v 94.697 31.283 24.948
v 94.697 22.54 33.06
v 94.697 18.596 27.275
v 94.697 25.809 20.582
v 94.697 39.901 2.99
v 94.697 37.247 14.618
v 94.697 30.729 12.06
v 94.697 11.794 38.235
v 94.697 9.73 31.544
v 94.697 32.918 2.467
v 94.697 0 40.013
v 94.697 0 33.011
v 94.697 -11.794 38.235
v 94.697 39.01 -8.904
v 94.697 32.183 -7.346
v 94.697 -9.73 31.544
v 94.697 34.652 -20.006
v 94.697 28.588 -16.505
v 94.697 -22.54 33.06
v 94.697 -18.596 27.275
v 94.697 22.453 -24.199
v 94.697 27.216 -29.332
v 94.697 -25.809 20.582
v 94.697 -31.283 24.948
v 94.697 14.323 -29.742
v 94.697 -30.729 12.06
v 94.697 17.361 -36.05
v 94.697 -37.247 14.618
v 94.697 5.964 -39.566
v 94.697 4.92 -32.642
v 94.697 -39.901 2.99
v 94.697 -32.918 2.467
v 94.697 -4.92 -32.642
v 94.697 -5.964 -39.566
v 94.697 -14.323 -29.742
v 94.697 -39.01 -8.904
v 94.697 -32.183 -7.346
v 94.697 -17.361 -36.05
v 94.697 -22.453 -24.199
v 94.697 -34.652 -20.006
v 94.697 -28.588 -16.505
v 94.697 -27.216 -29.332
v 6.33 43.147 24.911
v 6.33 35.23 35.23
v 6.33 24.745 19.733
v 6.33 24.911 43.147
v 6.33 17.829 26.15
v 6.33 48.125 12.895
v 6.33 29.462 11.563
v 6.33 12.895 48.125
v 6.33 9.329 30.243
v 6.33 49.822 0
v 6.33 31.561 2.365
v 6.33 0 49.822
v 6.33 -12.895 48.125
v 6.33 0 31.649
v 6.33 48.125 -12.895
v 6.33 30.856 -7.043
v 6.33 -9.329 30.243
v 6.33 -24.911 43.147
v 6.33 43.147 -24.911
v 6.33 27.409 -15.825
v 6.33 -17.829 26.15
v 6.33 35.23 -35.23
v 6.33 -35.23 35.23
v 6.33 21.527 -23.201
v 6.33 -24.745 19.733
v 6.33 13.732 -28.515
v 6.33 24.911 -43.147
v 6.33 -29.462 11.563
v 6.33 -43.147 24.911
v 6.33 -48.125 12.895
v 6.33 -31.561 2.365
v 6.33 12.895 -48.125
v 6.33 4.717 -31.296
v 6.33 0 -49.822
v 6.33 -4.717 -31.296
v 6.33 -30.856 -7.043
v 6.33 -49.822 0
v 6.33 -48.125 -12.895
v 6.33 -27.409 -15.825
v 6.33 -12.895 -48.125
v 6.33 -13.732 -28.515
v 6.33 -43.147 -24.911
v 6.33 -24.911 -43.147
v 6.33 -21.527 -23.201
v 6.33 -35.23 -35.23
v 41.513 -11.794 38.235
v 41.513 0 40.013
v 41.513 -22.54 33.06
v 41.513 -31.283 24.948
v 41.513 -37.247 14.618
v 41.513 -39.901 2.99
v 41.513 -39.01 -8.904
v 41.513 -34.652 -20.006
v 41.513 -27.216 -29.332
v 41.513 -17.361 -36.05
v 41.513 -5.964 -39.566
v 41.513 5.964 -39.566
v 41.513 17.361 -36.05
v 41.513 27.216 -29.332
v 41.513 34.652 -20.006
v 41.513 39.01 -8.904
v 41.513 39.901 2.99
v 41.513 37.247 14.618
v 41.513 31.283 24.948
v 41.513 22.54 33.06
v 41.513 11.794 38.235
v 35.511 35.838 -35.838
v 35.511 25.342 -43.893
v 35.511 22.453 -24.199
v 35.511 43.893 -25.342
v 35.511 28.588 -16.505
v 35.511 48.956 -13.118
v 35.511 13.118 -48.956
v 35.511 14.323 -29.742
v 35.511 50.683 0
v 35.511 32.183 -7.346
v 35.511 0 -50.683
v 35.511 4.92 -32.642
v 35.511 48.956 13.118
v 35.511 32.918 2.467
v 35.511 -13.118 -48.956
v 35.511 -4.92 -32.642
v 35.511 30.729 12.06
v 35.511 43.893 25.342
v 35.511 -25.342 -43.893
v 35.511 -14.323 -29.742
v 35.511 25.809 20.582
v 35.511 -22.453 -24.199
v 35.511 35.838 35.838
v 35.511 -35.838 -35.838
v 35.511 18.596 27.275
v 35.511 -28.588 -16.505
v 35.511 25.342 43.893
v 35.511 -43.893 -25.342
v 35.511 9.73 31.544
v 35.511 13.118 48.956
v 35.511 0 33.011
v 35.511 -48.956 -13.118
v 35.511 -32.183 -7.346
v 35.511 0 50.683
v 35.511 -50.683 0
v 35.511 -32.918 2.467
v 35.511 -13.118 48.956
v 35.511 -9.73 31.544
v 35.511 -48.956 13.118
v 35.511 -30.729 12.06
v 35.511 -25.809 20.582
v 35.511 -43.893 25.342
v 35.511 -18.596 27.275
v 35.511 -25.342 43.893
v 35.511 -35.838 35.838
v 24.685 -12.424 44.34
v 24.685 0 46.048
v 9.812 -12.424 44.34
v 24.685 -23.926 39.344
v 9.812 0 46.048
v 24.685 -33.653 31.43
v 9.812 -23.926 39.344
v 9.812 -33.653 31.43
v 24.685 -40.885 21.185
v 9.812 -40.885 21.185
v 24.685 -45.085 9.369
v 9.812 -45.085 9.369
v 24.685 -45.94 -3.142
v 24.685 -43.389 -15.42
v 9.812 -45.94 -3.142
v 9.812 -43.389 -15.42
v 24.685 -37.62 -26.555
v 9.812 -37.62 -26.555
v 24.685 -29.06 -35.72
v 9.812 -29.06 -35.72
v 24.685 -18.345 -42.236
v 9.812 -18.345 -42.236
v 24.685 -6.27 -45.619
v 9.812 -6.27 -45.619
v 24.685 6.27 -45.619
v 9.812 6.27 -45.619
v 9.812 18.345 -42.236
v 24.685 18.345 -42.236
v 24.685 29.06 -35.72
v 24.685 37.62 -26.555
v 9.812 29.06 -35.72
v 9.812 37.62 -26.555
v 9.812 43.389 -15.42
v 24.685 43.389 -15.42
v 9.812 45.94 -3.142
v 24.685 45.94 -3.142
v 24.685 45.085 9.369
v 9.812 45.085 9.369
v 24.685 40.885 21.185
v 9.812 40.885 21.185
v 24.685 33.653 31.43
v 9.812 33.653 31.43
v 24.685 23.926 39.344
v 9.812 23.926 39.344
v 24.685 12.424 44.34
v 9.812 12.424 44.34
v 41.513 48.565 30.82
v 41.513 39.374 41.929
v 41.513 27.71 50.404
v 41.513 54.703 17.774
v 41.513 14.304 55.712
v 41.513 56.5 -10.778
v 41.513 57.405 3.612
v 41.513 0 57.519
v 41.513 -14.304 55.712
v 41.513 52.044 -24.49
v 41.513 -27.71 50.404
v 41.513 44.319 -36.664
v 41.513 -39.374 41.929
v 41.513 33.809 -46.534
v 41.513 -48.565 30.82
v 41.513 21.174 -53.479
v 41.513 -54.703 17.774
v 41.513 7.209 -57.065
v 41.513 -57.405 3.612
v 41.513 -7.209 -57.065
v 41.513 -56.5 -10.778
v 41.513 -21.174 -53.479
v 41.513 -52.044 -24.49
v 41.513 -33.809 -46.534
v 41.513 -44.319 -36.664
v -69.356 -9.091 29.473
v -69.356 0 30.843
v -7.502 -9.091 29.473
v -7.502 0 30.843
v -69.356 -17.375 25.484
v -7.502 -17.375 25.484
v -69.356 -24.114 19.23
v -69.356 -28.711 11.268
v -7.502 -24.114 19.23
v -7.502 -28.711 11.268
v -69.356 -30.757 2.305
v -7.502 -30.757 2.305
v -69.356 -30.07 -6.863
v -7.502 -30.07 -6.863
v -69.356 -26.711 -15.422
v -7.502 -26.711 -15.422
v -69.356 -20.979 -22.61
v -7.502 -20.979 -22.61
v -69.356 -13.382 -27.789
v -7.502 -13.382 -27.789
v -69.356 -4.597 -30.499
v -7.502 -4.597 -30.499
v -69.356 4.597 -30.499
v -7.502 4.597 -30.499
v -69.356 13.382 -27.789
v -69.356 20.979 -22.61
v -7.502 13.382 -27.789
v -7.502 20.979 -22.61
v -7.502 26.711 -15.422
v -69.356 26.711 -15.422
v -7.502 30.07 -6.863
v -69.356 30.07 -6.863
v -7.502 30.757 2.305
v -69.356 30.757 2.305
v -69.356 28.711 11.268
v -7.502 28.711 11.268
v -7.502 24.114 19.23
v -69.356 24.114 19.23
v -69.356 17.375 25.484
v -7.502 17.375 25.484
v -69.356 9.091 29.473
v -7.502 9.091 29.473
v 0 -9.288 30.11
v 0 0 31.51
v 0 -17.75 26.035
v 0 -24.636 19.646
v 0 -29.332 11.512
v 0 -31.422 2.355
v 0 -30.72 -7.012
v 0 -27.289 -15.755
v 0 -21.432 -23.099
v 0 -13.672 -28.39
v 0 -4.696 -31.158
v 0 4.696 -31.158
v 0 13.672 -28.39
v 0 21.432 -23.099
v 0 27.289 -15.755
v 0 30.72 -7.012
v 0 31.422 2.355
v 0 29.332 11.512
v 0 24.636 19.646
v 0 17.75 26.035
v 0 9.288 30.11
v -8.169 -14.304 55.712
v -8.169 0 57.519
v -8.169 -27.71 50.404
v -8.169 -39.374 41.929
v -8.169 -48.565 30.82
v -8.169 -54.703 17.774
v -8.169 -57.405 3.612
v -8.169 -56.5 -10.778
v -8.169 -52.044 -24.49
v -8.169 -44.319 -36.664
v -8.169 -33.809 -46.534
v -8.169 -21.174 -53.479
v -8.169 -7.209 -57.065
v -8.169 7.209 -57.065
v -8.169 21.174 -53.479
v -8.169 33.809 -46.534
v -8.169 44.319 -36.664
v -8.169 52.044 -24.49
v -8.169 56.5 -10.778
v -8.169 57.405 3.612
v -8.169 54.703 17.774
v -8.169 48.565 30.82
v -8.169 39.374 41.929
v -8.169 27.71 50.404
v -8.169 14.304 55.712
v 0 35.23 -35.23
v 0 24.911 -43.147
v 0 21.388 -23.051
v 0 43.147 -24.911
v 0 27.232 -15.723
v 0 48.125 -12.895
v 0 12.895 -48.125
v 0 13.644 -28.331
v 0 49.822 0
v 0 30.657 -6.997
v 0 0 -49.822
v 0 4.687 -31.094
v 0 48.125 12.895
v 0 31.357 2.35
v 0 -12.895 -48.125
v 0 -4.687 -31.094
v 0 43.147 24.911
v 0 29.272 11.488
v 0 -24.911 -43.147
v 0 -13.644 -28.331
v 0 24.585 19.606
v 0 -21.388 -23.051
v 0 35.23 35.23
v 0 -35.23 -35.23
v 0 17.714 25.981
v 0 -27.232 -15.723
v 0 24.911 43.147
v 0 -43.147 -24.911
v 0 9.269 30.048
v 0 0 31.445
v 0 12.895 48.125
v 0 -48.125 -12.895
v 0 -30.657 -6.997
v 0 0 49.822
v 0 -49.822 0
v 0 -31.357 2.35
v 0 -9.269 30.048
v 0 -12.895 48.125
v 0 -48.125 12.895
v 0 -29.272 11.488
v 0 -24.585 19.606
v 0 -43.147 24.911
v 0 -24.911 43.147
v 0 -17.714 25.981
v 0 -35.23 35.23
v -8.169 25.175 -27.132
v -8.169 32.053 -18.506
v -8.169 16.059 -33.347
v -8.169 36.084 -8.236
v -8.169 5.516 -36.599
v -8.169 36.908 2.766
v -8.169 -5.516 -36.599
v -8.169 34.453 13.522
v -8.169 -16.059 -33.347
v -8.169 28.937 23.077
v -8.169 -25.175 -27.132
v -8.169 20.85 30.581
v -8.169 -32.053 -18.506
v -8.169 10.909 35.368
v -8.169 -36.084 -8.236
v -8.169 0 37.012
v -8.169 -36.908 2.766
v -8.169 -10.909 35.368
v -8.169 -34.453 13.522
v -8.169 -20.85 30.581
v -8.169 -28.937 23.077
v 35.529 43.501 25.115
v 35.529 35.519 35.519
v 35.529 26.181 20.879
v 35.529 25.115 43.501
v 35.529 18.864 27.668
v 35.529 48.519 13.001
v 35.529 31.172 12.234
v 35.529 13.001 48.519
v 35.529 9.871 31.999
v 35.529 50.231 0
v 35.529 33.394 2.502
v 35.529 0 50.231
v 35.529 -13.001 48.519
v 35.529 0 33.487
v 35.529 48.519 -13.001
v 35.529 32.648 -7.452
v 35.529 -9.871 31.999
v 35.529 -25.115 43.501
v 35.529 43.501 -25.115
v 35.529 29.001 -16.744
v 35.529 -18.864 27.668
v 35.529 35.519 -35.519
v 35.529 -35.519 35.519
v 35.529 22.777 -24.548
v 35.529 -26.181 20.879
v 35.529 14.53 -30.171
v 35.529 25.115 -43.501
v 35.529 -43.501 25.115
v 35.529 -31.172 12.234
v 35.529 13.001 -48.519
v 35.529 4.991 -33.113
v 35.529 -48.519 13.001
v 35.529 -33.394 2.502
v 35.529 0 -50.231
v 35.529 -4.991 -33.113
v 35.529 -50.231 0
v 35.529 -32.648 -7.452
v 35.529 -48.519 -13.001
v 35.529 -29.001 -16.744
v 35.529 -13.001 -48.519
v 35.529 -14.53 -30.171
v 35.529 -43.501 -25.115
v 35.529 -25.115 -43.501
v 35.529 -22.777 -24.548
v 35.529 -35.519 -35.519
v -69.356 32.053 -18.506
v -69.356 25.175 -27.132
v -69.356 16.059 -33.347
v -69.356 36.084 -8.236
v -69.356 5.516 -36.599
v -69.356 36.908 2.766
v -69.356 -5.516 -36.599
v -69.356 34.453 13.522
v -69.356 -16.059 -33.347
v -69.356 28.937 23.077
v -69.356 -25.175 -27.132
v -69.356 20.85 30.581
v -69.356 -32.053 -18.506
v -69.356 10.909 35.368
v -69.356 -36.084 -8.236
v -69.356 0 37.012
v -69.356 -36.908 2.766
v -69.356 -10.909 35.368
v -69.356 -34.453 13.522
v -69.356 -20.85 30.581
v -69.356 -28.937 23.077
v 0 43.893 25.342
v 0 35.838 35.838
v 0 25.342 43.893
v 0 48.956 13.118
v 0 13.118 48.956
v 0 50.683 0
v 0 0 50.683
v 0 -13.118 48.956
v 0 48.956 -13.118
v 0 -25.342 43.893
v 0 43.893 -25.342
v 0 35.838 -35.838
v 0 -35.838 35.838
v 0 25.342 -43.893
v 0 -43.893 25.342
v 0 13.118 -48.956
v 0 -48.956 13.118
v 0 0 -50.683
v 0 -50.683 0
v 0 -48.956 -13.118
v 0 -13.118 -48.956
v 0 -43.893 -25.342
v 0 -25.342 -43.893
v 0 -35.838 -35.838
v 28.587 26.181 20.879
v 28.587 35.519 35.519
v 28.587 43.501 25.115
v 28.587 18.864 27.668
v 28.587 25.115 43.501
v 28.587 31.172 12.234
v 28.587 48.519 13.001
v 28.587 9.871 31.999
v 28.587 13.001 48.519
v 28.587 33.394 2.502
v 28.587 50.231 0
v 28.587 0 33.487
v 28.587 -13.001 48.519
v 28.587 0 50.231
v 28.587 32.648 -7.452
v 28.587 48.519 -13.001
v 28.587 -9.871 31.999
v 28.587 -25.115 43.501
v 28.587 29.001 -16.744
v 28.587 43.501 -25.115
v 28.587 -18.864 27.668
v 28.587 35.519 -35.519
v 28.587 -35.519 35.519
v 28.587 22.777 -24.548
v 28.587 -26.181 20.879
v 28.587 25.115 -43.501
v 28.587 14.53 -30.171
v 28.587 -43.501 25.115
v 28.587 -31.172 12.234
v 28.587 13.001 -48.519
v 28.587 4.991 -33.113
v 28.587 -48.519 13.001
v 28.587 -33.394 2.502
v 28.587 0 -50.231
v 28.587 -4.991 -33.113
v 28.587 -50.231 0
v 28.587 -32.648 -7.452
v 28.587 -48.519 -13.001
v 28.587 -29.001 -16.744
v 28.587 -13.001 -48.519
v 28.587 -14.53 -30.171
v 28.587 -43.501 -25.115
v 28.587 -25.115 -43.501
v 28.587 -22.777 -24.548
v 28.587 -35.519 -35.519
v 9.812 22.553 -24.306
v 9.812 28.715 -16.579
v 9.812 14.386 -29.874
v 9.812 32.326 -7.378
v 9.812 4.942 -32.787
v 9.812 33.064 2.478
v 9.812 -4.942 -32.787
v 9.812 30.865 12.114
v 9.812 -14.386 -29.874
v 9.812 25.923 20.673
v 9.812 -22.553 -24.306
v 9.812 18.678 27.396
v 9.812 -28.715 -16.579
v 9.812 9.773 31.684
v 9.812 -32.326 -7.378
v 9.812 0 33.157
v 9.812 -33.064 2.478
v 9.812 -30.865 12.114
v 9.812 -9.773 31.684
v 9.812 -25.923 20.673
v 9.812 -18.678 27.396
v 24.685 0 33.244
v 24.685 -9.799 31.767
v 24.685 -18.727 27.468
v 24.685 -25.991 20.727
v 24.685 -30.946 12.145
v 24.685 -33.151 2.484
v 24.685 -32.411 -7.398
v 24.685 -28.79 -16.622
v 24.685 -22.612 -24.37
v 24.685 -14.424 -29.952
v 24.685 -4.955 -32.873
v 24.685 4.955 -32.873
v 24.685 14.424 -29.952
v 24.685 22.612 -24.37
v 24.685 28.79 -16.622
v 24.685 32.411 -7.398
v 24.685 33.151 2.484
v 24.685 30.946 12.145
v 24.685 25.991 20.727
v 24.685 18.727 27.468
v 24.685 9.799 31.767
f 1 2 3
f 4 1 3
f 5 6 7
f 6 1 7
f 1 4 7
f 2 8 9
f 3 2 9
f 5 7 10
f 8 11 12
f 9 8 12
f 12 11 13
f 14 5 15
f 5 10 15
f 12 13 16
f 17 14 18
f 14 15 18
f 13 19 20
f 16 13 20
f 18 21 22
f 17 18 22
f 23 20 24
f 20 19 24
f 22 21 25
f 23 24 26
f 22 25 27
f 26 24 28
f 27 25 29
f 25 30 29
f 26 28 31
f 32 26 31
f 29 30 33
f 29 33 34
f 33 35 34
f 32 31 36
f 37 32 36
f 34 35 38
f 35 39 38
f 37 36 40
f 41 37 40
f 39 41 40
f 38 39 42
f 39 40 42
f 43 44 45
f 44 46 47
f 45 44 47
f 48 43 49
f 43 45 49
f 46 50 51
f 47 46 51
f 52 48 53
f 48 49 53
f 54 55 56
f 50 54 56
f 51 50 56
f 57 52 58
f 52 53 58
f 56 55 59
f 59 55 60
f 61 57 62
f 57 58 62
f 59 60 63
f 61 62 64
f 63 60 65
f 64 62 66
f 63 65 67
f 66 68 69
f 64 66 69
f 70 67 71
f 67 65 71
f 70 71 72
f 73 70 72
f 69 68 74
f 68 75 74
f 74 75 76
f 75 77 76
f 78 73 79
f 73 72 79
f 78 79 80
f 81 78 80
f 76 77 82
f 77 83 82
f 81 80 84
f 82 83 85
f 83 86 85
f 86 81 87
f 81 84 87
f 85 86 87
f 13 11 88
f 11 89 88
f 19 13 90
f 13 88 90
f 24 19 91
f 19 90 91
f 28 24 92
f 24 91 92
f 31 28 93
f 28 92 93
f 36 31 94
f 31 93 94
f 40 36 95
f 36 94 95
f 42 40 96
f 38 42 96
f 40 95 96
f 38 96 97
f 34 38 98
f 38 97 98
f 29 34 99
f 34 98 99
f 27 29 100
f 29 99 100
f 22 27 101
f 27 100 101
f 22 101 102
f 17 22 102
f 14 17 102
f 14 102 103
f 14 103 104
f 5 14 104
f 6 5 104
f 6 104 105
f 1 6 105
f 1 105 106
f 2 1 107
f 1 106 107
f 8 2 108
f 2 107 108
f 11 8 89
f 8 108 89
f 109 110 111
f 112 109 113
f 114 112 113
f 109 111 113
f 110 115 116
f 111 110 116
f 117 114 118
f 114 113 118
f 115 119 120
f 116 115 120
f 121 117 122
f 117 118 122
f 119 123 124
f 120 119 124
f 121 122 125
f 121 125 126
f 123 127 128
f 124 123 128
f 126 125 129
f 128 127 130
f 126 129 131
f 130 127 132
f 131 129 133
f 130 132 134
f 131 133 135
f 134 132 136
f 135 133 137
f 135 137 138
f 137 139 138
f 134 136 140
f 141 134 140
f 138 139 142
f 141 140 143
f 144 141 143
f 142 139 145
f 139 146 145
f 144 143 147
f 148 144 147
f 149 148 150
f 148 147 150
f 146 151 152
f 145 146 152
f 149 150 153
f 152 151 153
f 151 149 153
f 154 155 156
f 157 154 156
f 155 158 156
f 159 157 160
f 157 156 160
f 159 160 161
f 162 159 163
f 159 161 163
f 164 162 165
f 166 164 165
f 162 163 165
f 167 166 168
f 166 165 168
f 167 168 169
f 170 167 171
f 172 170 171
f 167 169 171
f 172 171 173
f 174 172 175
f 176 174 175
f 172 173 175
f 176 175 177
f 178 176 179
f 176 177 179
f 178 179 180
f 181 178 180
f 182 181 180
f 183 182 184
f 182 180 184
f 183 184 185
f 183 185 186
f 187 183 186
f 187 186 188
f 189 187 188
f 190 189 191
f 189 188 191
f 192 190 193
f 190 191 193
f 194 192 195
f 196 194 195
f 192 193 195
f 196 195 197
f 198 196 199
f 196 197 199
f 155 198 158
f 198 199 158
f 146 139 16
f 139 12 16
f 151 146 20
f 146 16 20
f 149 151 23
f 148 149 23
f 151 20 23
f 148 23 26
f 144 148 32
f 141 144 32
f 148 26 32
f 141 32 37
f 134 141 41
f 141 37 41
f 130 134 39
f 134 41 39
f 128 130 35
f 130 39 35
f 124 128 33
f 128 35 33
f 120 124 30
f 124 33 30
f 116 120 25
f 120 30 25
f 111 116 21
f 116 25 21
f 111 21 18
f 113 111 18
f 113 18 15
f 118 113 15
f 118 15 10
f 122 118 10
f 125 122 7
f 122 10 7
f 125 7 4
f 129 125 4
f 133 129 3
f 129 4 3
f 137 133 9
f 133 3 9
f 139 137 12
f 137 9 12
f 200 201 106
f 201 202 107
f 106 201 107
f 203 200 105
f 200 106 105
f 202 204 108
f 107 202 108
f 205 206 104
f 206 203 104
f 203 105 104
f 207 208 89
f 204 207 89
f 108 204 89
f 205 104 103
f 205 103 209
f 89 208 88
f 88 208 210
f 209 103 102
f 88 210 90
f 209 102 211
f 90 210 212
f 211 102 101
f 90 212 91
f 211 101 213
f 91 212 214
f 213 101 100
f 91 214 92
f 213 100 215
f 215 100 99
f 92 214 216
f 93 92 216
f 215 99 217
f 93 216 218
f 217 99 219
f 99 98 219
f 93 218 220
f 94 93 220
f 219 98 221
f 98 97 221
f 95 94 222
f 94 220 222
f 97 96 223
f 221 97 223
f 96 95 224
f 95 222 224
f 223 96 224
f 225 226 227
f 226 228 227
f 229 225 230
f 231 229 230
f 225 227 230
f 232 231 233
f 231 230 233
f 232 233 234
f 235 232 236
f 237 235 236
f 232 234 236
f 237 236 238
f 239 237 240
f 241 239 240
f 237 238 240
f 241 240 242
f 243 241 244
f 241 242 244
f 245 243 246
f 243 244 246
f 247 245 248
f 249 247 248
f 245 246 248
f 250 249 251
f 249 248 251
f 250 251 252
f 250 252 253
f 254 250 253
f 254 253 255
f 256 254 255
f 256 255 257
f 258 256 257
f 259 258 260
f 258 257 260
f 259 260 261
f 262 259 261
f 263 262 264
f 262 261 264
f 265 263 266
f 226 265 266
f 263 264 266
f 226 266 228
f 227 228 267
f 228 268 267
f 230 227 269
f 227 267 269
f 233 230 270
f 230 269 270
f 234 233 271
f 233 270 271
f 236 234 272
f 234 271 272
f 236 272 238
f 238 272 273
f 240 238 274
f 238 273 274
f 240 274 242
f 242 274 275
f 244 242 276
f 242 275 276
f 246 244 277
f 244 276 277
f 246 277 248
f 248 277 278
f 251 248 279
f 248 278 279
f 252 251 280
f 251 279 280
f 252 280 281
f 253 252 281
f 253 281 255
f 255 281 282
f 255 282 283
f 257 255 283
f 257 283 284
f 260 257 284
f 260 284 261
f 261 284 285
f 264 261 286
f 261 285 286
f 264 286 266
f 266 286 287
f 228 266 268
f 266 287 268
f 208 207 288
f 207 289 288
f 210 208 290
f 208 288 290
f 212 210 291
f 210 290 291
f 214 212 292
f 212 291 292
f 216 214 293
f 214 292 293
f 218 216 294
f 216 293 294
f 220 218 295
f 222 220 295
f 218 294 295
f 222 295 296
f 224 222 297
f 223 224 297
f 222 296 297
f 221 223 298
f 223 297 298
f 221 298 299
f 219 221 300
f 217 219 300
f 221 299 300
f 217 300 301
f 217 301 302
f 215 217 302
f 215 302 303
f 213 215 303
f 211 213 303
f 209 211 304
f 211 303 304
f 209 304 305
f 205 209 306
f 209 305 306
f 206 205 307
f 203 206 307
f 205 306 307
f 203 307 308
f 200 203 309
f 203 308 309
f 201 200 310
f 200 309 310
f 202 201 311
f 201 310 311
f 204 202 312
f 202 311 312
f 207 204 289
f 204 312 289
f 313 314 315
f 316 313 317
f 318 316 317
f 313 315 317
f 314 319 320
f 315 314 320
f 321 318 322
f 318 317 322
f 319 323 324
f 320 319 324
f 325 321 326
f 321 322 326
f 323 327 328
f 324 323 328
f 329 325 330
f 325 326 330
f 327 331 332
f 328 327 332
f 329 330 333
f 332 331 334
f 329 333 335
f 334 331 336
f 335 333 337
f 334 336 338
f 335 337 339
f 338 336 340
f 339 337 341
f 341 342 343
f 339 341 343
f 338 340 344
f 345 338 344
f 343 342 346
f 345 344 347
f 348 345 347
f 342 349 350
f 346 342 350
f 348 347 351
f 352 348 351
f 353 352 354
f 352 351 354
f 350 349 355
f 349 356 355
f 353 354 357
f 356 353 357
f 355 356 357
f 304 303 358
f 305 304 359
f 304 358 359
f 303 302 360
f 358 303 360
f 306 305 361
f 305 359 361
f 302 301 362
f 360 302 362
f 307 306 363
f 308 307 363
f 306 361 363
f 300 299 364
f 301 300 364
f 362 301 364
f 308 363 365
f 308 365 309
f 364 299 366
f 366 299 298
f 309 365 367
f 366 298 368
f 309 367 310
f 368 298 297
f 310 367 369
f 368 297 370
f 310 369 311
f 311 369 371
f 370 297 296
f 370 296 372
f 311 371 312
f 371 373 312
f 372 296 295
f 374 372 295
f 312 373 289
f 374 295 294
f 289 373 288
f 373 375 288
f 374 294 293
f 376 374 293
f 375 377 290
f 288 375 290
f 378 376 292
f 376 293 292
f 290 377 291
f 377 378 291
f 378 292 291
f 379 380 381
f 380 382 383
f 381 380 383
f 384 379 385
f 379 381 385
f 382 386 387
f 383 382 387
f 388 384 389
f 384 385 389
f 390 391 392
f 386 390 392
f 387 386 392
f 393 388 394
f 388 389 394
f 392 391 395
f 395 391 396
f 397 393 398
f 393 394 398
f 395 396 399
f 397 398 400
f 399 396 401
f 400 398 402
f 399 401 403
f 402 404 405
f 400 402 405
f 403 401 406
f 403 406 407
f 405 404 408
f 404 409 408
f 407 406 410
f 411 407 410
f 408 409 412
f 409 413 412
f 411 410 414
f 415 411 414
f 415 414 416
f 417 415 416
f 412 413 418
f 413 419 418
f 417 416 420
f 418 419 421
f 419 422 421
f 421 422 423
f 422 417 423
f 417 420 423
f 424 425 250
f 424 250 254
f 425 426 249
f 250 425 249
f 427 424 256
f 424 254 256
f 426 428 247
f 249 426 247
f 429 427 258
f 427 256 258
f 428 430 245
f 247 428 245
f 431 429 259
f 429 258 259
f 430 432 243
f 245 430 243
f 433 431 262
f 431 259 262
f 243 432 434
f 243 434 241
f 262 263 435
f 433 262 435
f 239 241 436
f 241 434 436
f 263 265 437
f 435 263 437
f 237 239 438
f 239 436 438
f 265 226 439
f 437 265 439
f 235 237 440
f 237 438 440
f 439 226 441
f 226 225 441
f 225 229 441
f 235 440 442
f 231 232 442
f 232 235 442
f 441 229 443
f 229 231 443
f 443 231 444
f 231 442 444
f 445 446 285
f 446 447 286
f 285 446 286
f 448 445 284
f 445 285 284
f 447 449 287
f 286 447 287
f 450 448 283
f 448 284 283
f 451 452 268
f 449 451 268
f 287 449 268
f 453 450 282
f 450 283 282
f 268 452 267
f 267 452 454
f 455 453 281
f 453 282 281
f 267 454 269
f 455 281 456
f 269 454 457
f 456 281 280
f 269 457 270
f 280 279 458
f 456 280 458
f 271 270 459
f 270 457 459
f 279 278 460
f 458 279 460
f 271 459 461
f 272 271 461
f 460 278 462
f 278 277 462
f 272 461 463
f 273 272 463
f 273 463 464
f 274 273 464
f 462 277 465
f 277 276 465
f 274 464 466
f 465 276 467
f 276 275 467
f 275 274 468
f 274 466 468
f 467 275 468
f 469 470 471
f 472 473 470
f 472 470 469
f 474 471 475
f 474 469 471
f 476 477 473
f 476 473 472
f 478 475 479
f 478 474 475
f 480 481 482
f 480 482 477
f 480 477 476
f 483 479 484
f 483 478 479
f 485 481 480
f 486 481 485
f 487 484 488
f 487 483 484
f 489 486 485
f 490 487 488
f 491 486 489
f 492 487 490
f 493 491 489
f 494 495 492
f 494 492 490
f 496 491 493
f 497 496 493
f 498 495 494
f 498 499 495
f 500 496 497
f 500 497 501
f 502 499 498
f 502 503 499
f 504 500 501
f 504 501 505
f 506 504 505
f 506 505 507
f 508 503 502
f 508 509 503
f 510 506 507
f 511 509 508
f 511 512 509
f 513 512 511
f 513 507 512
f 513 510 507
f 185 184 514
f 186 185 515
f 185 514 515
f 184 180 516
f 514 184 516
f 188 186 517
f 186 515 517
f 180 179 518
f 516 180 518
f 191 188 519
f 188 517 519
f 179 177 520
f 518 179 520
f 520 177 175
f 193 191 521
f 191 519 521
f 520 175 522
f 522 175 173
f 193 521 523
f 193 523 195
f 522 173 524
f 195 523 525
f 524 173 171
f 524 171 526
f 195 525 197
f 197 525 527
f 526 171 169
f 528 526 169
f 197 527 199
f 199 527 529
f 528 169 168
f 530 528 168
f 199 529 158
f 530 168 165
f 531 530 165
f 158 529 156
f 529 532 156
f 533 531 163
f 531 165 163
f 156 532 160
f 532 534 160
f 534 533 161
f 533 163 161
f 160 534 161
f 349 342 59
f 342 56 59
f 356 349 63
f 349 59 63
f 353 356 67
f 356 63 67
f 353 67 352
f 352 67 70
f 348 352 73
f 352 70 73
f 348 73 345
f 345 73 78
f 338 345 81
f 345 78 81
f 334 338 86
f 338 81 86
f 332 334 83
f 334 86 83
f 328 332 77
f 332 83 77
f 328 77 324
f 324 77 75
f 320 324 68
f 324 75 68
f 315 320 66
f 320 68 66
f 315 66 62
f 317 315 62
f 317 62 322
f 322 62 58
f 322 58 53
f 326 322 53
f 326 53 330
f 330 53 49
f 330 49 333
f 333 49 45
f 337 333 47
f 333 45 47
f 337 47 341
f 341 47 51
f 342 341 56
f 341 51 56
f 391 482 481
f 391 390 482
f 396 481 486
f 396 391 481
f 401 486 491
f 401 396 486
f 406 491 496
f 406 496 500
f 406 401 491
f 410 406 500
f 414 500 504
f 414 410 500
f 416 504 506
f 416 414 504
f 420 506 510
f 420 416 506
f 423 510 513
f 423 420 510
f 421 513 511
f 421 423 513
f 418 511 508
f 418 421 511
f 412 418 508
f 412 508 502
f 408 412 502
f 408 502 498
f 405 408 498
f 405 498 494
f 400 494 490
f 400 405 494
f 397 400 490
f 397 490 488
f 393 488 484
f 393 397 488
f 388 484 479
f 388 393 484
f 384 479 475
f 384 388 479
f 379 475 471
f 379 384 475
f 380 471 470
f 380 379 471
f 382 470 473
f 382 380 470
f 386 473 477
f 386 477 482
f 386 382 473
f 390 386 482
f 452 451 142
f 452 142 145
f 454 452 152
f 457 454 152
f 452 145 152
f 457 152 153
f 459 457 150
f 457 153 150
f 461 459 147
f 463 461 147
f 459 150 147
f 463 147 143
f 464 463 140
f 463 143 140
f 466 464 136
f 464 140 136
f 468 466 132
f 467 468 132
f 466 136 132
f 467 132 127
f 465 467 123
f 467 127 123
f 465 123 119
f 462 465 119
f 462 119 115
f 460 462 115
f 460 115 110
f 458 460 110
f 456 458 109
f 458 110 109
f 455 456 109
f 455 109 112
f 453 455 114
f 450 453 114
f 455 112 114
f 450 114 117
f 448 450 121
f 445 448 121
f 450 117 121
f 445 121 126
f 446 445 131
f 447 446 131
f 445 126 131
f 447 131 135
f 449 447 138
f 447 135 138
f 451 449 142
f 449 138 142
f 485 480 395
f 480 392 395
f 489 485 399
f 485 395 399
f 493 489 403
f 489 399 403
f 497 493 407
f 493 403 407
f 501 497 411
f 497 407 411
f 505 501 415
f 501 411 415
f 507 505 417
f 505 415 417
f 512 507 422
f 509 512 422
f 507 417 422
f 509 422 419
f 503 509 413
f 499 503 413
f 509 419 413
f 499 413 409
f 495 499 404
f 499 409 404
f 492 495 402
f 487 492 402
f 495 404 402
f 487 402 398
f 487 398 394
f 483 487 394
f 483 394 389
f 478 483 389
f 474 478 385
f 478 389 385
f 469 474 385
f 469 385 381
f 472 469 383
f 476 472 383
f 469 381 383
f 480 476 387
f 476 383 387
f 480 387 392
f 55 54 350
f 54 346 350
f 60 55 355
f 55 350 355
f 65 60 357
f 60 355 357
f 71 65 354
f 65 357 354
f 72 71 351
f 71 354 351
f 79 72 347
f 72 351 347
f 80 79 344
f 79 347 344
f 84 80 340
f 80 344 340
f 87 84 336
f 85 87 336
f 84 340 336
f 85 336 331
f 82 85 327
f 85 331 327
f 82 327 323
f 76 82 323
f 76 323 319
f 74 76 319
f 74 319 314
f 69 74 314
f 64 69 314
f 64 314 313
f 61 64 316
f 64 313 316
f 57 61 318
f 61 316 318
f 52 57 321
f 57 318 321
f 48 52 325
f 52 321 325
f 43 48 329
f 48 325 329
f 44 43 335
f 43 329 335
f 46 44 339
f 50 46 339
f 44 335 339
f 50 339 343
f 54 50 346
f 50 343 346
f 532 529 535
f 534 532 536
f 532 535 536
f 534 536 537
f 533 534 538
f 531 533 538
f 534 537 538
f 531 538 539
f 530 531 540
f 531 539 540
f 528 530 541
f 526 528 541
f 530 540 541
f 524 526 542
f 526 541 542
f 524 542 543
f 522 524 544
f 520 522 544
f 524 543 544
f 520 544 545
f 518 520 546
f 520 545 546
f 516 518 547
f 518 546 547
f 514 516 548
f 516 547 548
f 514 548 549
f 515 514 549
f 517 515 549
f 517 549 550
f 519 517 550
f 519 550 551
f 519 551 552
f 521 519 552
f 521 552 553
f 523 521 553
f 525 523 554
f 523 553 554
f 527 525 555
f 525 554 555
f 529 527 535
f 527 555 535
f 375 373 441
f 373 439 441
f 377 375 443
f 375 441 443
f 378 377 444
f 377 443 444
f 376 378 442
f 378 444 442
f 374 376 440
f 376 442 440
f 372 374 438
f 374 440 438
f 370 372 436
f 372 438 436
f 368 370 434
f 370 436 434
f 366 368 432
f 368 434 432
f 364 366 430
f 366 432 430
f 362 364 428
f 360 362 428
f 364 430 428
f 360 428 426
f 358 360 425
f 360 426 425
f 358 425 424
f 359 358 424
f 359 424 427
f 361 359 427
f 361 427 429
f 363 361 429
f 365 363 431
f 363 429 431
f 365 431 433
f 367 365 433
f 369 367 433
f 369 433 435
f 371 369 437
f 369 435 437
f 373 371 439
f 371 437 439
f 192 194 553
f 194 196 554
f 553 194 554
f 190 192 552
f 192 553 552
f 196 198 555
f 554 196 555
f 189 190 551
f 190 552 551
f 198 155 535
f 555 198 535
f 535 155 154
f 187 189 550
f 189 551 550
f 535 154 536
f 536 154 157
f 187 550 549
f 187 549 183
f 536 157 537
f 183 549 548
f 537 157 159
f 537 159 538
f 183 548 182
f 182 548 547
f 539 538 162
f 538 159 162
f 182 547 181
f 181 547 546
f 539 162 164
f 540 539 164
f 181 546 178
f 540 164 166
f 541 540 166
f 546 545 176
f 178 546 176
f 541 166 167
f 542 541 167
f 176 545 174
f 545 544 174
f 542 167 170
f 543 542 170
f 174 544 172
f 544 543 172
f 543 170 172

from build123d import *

# Parameters (mm, degrees)
F2_W = 6.942466
F2_H = 16.743593


with BuildPart() as f4:
    # F3 (on Front) → F4 (revolve)
    with BuildSketch(Plane.XZ):
        Polygon((9.811549, 46.047769), (9.811549, 33.157088), (24.685381, 33.244226), (24.685381, 46.047769), align=None)
    revolve(axis=Axis((-37.262052, 0, 0), (1, 0, 0)))


with BuildPart() as f5:
    # F2 (on Front) → F5 (revolve)
    with BuildSketch(Plane.XZ):
        with Locations((32.057829, 41.858967)):
            Rectangle(F2_W, F2_H)
    revolve(axis=Axis((-37.262052, 0, 0), (1, 0, 0)))


with BuildPart() as f6:
    # F1 (on Front) → F6 (revolve)
    with BuildSketch(Plane.XZ):
        Polygon((0, 49.822383), (0, 31.445272), (6.329879, 31.649463), (6.329879, 49.822383), align=None)
    revolve(axis=Axis((-37.262052, 0, 0), (1, 0, 0)))


with BuildPart() as f7:
    # F0 (on Front) → F7 (revolve)
    with BuildSketch(Plane.XZ):
        Polygon((-69.355756, 30.843295), (-7.502437, 30.843295), (0, 31.510144), (0, 50.683007), (35.511479, 50.683007), (35.511479, 33.010662), (94.697267, 33.010662), (94.697267, 40.012926), (41.513398, 40.012926), (41.513398, 57.518579), (-8.169323, 57.518579), (-8.169323, 37.011951), (-69.355756, 37.011951), align=None)
    revolve(axis=Axis((-37.262052, 0, 0), (1, 0, 0)))


solid = Compound([f4.part, f5.part, f6.part, f7.part])
